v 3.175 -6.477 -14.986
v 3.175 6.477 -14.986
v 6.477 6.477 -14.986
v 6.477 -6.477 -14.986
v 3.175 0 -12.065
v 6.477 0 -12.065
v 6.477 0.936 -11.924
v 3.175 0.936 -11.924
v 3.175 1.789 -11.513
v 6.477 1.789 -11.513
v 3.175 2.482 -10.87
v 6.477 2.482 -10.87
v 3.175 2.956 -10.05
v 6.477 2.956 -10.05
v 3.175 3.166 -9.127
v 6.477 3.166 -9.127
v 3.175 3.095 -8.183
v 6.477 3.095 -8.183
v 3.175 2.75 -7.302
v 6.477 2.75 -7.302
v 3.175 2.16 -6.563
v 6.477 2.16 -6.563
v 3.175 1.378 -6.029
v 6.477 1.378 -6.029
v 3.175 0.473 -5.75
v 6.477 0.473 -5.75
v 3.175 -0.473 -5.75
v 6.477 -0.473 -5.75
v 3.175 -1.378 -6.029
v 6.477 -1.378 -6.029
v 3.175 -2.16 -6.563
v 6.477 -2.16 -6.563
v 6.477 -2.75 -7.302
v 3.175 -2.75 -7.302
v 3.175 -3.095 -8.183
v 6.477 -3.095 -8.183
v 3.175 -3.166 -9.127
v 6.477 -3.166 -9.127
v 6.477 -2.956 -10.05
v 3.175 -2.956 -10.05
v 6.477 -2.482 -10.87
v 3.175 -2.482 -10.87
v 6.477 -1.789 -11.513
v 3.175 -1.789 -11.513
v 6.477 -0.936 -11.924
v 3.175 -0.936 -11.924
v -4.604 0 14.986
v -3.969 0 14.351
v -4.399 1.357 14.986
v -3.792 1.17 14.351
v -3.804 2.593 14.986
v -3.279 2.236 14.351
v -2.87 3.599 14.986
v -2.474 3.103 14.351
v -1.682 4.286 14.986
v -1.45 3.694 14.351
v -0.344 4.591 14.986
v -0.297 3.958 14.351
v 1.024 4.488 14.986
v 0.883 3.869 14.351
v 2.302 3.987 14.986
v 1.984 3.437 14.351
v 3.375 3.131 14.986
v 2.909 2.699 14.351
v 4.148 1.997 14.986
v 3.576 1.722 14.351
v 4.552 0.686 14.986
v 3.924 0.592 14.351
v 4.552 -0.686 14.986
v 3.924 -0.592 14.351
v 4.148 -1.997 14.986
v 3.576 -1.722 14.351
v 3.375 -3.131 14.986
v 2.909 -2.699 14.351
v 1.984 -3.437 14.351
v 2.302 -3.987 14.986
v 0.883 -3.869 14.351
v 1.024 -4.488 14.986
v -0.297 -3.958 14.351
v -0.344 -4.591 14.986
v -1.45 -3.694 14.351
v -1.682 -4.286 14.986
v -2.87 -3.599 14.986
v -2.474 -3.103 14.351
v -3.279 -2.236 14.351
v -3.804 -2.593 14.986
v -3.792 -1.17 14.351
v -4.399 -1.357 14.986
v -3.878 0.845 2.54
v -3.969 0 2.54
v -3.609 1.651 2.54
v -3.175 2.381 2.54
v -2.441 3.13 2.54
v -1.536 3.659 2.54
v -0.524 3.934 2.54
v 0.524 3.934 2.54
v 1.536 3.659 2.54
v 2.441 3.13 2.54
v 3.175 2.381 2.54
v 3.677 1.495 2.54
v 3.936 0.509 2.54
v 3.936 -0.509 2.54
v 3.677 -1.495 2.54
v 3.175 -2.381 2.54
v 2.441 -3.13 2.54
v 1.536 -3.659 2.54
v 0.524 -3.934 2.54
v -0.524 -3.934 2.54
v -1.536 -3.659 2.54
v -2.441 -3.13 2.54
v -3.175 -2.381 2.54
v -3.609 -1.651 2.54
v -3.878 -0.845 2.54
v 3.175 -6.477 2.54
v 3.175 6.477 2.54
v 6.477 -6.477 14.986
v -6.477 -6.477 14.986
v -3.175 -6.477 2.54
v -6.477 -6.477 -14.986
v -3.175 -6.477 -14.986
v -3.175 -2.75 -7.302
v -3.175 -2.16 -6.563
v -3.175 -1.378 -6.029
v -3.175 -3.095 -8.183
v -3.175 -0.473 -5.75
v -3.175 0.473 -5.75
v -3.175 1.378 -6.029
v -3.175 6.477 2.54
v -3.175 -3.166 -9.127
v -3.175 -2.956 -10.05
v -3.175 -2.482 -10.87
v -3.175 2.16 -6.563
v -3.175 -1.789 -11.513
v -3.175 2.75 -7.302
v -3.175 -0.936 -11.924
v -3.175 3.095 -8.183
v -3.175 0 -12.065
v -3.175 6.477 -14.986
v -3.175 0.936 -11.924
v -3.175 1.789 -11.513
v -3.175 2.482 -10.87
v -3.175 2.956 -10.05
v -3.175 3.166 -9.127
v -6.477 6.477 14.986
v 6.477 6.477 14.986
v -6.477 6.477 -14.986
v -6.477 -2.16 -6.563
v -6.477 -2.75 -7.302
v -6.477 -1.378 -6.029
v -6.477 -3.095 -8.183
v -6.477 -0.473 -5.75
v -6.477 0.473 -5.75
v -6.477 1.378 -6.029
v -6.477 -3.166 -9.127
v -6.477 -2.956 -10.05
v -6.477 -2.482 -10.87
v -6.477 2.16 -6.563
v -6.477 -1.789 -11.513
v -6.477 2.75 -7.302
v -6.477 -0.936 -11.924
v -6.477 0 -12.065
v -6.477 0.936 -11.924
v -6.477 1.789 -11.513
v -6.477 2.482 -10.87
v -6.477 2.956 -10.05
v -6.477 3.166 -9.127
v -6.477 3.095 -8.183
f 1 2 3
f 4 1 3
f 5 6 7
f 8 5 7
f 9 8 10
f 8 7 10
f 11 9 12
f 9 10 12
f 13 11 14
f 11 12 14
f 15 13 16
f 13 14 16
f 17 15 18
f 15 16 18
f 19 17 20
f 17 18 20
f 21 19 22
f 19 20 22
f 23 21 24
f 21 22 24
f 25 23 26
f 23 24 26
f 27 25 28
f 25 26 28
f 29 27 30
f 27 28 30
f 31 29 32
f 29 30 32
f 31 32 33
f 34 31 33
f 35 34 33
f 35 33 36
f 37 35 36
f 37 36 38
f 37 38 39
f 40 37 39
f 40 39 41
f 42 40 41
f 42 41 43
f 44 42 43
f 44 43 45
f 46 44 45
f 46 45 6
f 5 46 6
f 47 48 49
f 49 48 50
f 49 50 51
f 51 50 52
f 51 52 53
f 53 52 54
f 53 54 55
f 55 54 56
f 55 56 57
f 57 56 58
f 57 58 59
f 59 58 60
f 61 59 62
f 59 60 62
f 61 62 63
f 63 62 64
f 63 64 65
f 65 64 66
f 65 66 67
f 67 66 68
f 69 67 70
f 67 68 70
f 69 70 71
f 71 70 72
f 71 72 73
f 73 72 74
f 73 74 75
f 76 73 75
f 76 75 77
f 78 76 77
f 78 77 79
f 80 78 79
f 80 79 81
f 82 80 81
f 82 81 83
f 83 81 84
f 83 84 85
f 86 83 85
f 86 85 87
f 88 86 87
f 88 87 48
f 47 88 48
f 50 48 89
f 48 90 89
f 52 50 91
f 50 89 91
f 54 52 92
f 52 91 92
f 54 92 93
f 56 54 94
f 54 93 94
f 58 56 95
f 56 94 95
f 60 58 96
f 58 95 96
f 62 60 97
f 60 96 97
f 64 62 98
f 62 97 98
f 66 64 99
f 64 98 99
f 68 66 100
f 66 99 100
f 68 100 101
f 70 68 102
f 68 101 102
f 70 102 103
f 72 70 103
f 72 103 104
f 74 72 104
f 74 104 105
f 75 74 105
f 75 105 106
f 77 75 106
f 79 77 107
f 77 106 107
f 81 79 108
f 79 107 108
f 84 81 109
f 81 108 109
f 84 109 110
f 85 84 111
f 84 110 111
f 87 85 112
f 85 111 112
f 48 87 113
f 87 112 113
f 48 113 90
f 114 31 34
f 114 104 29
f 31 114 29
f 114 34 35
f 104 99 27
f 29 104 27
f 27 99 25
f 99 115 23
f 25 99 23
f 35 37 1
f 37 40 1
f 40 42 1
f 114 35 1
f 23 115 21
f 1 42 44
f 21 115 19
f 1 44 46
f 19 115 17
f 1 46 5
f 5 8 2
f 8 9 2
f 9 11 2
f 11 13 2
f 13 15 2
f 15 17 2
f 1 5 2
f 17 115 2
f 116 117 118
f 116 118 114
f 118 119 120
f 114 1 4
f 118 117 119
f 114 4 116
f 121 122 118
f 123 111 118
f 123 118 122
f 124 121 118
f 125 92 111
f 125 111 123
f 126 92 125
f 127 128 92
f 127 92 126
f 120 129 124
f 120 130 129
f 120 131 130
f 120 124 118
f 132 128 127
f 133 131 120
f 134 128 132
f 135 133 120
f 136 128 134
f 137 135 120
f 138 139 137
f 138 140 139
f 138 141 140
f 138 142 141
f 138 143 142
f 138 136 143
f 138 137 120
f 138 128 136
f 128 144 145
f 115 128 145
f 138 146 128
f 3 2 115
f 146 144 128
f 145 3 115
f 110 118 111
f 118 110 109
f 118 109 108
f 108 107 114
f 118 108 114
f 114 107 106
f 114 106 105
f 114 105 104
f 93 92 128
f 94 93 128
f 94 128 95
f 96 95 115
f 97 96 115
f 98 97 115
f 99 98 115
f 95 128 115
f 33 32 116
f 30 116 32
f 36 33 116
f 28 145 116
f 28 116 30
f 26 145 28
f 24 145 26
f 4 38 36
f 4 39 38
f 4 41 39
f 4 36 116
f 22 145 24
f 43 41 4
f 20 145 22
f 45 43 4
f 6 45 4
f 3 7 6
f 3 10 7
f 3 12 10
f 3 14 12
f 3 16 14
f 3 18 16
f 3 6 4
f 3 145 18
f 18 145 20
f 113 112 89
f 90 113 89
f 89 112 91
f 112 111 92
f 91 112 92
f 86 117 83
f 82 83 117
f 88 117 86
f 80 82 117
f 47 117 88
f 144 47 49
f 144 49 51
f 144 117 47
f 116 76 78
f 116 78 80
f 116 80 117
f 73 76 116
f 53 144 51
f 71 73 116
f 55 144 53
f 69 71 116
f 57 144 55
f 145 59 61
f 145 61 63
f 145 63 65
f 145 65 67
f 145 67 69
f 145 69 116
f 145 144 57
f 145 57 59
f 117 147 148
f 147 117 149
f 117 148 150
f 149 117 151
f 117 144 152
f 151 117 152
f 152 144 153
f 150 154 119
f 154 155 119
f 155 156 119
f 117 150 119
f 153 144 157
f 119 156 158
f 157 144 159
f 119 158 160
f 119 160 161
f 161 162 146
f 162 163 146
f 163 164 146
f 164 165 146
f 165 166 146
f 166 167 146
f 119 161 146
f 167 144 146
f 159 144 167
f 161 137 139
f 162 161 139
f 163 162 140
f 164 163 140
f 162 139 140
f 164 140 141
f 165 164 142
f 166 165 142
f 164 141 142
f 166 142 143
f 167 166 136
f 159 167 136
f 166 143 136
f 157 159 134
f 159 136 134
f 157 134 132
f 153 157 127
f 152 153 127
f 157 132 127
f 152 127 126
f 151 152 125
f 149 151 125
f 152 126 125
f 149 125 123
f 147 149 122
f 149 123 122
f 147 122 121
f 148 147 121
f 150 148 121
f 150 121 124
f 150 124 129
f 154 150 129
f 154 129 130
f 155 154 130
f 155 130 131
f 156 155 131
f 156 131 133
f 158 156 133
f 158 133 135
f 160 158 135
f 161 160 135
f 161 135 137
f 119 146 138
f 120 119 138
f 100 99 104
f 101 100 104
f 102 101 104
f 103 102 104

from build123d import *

# Parameters (mm, degrees)
SKETCH1_W                          = 12.954
SKETCH1_H                          = 29.972
EXTRUDE1_DEPTH                     = 6.477
SKETCH2_W                          = 6.35
SKETCH2_H                          = 17.526
EXTRUDE2_DEPTH                     = 13.954
SKETCH5_R                          = 3.175
EXTRUDE3_DEPTH                     = 13.954
F_5_16_24_TAPPED_HOLE1_D           = 7.9375
F_5_16_24_TAPPED_HOLE1_DEPTH       = 12.446
F_5_16_24_TAPPED_HOLE1_CSINK_D     = 9.2075
F_5_16_24_TAPPED_HOLE1_CSINK_ANGLE = 90


with BuildPart() as part:
    # Sketch1 → Extrude1 (new body, symmetric)
    with BuildSketch(Plane(origin=(0, 0, 0), x_dir=(1, 0, 0), z_dir=(0, 1, 0))):
        Rectangle(SKETCH1_W, SKETCH1_H)
    extrude(amount=EXTRUDE1_DEPTH, both=True)

    # Sketch2 → Extrude2 (cut, through all)
    with BuildSketch(Plane(origin=(0, 6.477, 0), x_dir=(1, 0, 0), z_dir=(0, 1, 0))):
        with Locations((0, 6.223)):
            Rectangle(SKETCH2_W, SKETCH2_H)
    extrude(amount=-EXTRUDE2_DEPTH, mode=Mode.SUBTRACT)

    # Sketch5 → Extrude3 (cut, through all)
    with BuildSketch(Plane(origin=(6.477, 0, 0), x_dir=(0, 0, -1), z_dir=(1, 0, 0))):
        with Locations((8.89, 0)):
            Circle(SKETCH5_R)
    extrude(amount=-EXTRUDE3_DEPTH, mode=Mode.SUBTRACT)

    # 5/16-24 Tapped Hole1
    with Locations(Plane.XY.offset(14.986)):
        with Locations((0, 0)):
            CounterSinkHole(F_5_16_24_TAPPED_HOLE1_D / 2, F_5_16_24_TAPPED_HOLE1_CSINK_D / 2, depth=F_5_16_24_TAPPED_HOLE1_DEPTH, counter_sink_angle=F_5_16_24_TAPPED_HOLE1_CSINK_ANGLE)


solid = part.part
